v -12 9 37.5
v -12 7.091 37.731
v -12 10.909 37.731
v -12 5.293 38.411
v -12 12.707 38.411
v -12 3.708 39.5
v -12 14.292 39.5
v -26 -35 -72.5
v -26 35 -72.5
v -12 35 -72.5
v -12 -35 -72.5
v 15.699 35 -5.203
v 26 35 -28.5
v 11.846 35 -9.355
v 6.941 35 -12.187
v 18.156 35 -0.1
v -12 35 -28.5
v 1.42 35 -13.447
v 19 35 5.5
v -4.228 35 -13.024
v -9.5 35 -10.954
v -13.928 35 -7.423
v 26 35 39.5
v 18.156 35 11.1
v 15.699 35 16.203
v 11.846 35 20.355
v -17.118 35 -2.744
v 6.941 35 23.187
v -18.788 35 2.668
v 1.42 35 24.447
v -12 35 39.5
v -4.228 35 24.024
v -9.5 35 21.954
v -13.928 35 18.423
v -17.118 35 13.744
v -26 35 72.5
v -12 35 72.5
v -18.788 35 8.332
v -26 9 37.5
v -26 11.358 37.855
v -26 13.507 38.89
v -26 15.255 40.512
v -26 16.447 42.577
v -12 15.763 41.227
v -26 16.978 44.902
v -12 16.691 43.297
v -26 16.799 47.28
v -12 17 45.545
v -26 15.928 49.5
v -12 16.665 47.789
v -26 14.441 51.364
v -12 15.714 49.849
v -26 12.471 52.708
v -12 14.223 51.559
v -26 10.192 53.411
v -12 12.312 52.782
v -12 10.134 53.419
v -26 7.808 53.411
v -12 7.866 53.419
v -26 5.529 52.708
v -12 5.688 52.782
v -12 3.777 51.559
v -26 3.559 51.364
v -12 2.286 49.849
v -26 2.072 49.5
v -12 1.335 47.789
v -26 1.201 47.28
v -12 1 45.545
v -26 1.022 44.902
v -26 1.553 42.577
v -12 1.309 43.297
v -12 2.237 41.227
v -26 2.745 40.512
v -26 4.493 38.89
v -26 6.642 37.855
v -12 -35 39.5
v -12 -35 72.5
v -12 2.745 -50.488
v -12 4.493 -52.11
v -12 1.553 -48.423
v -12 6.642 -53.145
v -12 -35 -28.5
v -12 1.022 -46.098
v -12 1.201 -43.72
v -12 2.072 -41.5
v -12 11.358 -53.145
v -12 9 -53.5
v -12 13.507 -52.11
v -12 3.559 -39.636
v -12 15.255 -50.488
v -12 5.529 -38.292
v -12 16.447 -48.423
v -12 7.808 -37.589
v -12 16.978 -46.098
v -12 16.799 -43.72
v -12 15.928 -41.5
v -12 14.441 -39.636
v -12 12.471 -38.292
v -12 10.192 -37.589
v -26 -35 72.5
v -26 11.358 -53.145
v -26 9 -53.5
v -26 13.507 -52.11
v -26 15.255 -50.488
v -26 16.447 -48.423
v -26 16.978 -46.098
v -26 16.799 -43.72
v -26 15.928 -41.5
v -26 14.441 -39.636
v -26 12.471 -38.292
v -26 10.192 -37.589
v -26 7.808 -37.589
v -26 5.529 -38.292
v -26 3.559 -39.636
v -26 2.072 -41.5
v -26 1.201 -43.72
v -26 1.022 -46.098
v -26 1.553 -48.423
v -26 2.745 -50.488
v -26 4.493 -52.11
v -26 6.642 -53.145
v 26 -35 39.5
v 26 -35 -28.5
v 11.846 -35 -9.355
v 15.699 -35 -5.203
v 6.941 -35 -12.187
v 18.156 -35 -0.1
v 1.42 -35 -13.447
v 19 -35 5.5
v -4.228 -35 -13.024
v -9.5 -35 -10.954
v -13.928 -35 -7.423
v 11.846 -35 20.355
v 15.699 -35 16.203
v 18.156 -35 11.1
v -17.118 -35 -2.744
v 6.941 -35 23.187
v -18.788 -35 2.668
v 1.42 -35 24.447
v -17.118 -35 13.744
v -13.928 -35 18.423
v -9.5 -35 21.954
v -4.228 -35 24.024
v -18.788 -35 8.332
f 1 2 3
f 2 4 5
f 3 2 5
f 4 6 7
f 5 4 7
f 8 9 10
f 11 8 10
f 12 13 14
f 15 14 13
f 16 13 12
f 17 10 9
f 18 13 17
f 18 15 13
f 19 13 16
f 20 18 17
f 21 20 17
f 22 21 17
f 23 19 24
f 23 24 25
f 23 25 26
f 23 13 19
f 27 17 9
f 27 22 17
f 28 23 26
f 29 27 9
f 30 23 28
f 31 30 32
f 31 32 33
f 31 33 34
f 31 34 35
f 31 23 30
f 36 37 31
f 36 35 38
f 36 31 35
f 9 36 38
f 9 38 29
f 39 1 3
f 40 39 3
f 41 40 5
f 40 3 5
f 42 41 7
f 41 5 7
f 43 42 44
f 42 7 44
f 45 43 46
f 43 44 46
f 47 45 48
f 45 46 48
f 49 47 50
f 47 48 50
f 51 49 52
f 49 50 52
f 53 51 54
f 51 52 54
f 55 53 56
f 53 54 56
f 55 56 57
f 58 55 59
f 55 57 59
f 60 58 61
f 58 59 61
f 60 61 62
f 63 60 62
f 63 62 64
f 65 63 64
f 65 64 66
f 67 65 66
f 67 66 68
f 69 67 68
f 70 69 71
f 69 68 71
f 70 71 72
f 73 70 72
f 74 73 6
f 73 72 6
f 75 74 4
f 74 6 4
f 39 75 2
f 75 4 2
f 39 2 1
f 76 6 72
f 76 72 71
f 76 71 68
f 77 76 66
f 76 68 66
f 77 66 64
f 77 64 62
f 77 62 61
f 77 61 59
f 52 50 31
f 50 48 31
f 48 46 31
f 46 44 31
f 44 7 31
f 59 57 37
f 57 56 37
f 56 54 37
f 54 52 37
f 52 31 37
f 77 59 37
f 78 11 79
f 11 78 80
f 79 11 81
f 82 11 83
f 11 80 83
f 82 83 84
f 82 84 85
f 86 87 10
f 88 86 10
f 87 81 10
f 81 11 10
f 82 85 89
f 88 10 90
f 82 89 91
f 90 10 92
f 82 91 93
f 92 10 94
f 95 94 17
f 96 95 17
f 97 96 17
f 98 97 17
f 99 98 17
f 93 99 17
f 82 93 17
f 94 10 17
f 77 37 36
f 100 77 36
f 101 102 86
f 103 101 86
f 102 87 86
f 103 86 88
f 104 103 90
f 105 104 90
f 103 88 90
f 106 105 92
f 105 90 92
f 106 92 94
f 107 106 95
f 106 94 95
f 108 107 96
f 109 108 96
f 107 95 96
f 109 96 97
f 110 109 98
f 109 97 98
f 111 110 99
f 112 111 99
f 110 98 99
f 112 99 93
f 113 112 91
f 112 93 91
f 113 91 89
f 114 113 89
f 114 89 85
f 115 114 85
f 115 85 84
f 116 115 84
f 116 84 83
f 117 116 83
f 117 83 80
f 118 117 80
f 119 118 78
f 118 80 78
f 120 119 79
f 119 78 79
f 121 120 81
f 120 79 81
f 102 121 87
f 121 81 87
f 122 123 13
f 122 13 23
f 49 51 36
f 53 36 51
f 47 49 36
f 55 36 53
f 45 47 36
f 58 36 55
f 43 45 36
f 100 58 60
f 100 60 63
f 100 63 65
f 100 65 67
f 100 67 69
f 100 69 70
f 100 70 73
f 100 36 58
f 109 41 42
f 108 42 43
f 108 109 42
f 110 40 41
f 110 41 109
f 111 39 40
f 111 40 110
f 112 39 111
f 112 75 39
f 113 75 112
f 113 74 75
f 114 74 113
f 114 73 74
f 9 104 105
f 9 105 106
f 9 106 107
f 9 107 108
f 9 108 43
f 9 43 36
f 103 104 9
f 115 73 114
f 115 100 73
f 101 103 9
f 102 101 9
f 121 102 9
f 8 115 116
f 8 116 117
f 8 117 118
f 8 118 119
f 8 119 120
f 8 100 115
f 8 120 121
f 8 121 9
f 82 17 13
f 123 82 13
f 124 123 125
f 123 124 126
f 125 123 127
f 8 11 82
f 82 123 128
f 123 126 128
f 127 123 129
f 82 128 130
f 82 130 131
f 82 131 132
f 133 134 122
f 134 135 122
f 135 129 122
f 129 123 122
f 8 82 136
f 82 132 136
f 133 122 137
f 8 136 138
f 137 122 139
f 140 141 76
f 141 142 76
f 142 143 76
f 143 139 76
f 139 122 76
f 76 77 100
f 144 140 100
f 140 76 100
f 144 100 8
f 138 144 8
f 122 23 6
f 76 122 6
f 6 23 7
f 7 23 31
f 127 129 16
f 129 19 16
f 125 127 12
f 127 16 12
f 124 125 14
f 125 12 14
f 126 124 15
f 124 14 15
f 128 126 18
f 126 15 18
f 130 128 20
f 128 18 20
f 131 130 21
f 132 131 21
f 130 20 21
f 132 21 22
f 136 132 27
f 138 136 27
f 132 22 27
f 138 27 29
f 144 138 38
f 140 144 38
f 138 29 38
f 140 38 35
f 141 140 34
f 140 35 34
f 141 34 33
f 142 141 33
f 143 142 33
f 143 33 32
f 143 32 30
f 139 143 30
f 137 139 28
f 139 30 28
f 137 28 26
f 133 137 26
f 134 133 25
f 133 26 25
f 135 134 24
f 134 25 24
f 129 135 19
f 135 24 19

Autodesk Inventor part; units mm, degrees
ref_plane "YZ Plane" through (0, 0, 0) normal (1, 0, 0) x (0, 1, 0)
ref_plane "XZ Plane" through (0, 0, 0) normal (0, 1, 0) x (-1, 0, 0)
ref_plane "XY Plane" through (0, 0, 0) normal (0, 0, 1) x (1, 0, 0)
sketch "Sketch1" plane through (0, 0, 0) normal (0, 1, 0) x (-1, 0, 0)
  line L0 (26, -72.5) -> (-26, -72.5)
  line L1 (-26, -72.5) -> (-26, 72.5)
  line L2 (-26, 72.5) -> (26, 72.5)
  line L3 (26, 72.5) -> (26, -72.5)
  line L4 (26, -72.5) -> (-26, 72.5) construction
  line L5 (-26, -72.5) -> (26, 72.5) construction
  point P0 (0, 0)
  dimension "d0" = 52
  dimension "d1" = 145
extrude "Extrusion1" add sketch "Sketch1" along normal mid plane 70
sketch "Sketch2" plane through (0, 35, 0) normal (0, 1, 0) x (1, 0, 0)
  line L0 (26, -72.5) -> (26, 72.5) projected
  line L1 (26, 72.5) -> (-12, 72.5)
  line L2 (26, 72.5) -> (-26, 72.5) projected
  line L3 (-12, 72.5) -> (-12, 28.5)
  line L4 (-12, 28.5) -> (26, 28.5)
  line L5 (26, 28.5) -> (26, -39.5)
  line L6 (-26, -72.5) -> (26, -72.5) projected
  line L7 (26, -39.5) -> (-12, -39.5)
  line L8 (-12, -39.5) -> (-12, -72.5)
  point P0 (0, 0)
  point P1 (-12, -37.5)
  dimension "d4" = 38
  dimension "d5" = 44
  dimension "d6" = 68
extrude "Extrusion2" cut sketch "Sketch2" against normal blind 70
sketch "Sketch3" plane through (-12, 35, 72.5) normal (1, 0, 0) x (0, 0, -1)
  line L0 (145, 0) -> (0, 0) projected
  line L1 (0, 0) -> (0, -26)
  line L2 (0, 0) -> (0, -70) projected
  line L3 (0, -26) -> (27, -26)
  circle A0 centre (27, -26) radius 8
  line L4 (145, 0) -> (145, -26)
  line L5 (145, 0) -> (145, -70) projected
  line L6 (145, -26) -> (118, -26)
  circle A1 centre (118, -26) radius 8
  point P0 (72.5, -35)
  dimension "d9" = 26
  dimension "d10" = 27
  dimension "d11" = 16
  dimension "d12" = 26
  dimension "d13" = 27
  dimension "d14" = 16
extrude "Extrusion3" cut sketch "Sketch3" against normal blind 70
sketch "Sketch4" plane through (0, 35, 0) normal (0, 1, 0) x (1, 0, 0)
  line L0 (26, 28.5) -> (26, -39.5) projected
  line L1 (26, -39.5) -> (0, -39.5)
  line L2 (0, -39.5) -> (0, -5.5)
  circle A0 centre (0, -5.5) radius 19
  point P0 (0, 0)
  dimension "d17" = 34
  dimension "d18" = 38
extrude "Extrusion4" cut sketch "Sketch4" against normal blind 70
properties part number "carriage"
